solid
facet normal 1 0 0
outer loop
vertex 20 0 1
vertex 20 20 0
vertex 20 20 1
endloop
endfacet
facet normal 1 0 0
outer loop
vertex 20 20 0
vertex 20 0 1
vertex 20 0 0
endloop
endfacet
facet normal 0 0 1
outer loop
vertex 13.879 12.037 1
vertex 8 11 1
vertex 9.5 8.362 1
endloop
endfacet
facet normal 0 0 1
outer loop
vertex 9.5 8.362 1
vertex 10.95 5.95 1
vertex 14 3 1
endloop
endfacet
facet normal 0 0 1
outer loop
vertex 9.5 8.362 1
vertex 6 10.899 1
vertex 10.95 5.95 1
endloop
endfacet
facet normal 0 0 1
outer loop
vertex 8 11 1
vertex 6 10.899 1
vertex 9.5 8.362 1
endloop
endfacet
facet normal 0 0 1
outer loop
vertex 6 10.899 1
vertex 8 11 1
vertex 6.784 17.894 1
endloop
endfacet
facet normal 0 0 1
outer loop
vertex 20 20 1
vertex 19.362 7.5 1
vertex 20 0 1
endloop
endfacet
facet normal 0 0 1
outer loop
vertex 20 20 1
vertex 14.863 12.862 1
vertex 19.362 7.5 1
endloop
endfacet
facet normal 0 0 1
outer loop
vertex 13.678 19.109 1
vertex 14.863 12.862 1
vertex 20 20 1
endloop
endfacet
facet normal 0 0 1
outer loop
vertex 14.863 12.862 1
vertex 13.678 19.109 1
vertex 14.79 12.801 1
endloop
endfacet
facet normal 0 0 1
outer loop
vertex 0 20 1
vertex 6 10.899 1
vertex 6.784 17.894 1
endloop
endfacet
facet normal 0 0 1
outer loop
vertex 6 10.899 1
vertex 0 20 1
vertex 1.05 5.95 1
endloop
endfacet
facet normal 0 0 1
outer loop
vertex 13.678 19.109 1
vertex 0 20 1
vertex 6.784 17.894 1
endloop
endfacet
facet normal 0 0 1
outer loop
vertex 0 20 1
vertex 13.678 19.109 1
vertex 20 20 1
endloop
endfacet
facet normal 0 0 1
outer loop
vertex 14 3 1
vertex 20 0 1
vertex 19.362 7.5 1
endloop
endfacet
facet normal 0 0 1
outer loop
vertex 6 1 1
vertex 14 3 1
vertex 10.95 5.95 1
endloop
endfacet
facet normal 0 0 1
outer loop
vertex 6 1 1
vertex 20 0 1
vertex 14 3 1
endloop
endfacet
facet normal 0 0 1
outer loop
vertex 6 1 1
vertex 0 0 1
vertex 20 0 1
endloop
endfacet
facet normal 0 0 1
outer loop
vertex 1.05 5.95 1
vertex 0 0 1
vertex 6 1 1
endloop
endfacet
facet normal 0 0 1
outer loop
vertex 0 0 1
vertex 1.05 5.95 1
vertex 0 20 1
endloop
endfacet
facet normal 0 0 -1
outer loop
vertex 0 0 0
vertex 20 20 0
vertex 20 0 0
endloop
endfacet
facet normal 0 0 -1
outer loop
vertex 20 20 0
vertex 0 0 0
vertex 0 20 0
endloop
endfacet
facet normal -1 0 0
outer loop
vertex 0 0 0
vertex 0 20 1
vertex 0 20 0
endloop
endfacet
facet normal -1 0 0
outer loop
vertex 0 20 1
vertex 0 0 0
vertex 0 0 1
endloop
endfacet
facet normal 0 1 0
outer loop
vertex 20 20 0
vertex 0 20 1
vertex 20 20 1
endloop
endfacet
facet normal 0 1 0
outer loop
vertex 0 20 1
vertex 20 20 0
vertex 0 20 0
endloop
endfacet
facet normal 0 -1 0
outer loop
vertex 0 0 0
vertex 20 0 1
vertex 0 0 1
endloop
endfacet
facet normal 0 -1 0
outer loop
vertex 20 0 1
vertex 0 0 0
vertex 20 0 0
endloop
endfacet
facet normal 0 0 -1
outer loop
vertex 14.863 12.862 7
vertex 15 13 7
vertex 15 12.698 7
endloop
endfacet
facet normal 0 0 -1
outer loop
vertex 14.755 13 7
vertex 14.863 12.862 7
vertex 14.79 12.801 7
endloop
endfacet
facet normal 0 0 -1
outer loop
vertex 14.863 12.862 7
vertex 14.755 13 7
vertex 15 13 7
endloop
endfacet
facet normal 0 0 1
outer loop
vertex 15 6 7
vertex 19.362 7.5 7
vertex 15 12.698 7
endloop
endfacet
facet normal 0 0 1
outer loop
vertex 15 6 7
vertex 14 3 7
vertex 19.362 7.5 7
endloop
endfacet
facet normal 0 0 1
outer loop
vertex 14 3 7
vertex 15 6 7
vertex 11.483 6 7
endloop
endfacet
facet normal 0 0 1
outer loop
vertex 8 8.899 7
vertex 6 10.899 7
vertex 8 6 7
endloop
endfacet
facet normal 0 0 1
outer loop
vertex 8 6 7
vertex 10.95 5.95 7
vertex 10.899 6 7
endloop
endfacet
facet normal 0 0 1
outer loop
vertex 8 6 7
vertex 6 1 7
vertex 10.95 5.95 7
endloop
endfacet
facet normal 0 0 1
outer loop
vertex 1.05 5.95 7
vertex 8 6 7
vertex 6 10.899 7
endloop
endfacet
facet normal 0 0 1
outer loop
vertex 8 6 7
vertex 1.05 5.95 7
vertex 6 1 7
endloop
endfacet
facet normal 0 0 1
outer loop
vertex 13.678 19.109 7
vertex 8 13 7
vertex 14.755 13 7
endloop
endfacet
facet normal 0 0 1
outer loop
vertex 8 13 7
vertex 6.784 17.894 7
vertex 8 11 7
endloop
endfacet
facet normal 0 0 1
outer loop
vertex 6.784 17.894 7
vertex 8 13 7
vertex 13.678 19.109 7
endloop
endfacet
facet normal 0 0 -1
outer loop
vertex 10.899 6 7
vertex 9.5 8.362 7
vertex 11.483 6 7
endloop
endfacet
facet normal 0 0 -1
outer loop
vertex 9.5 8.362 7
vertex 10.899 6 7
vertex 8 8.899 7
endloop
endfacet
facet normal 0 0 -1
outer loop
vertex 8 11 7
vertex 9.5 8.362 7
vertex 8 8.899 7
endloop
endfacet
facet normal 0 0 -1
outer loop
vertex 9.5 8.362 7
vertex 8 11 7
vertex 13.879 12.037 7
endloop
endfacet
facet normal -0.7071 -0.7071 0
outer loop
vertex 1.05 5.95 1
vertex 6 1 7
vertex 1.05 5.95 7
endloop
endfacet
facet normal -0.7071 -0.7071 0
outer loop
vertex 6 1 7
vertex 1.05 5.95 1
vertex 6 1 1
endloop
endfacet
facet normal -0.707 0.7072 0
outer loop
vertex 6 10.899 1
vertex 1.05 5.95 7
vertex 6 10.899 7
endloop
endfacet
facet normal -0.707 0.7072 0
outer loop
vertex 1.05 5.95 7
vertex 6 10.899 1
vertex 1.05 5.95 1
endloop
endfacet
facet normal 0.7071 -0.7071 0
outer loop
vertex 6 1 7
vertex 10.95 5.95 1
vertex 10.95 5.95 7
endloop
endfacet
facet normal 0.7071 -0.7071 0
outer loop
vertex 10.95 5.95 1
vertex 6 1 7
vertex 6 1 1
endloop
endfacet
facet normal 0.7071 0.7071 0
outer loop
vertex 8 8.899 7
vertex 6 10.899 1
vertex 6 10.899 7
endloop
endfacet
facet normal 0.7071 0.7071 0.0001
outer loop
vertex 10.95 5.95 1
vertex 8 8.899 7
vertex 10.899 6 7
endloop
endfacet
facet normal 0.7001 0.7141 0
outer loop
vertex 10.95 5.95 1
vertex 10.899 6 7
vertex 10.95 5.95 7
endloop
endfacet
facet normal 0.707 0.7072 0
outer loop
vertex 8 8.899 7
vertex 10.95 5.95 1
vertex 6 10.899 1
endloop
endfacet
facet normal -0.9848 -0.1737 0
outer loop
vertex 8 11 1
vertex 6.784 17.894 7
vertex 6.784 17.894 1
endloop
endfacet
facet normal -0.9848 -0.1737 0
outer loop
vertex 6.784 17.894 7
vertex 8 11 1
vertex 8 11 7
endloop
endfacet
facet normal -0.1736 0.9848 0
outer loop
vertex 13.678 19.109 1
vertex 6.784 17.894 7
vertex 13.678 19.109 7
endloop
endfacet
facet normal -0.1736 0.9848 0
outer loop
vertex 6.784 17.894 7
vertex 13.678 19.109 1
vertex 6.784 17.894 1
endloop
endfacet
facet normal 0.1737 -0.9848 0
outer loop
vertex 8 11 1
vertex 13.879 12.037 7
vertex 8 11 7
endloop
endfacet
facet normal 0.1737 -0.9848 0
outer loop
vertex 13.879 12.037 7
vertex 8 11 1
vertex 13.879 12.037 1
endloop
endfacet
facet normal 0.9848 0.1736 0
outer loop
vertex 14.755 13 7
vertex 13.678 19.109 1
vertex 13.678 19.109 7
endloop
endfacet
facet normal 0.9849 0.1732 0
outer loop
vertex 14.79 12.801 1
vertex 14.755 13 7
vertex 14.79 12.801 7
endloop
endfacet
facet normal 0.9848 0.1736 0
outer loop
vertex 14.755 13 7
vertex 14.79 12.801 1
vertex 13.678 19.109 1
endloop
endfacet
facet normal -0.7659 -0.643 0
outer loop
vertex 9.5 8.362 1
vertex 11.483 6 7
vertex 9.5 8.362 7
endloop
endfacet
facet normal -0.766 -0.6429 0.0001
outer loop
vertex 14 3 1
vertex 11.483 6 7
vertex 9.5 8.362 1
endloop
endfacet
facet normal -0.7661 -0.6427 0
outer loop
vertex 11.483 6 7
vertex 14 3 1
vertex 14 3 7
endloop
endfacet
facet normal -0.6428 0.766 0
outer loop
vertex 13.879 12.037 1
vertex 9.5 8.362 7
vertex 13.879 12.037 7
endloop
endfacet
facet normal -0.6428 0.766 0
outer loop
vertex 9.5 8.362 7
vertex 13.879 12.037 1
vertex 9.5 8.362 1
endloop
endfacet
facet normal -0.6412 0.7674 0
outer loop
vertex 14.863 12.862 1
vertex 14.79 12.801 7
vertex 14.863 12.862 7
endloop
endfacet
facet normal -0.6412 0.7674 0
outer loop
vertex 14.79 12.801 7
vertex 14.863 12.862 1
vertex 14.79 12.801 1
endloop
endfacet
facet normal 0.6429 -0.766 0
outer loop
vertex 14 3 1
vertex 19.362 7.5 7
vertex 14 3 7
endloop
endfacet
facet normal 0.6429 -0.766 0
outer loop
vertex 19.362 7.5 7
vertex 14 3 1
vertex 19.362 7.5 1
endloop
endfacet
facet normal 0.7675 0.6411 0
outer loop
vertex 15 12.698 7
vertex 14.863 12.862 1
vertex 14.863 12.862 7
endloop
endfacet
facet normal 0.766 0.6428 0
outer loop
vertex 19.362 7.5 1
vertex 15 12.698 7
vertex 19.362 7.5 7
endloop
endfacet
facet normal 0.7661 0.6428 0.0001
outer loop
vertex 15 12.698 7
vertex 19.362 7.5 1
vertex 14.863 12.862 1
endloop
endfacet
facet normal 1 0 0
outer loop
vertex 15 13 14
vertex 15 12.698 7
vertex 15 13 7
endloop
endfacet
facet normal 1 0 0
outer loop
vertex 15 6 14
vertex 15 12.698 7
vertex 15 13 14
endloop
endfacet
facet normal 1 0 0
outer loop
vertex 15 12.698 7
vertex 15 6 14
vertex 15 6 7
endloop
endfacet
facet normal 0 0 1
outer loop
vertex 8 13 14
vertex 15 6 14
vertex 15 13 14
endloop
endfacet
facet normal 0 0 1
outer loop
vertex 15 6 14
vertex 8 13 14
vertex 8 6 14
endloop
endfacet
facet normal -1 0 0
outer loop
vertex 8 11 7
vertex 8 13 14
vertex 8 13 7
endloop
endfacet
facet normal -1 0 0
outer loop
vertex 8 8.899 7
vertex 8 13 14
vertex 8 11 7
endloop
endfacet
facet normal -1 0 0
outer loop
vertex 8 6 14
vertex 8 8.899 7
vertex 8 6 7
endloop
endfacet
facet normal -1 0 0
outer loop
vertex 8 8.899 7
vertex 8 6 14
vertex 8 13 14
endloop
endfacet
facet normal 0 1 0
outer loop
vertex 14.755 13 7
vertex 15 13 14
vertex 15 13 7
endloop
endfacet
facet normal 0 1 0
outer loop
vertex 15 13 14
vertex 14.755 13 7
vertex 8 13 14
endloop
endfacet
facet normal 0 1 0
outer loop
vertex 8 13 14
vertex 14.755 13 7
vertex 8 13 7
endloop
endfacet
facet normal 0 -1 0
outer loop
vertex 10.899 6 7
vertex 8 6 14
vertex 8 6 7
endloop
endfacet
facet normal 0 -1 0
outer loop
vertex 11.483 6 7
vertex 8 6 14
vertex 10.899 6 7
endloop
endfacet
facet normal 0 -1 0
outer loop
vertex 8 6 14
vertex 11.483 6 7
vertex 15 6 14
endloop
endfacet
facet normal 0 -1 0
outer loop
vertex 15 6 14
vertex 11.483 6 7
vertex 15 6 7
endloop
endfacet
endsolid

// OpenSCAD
// file: ../OpenSCAD/HourOfCode.scad
tileHeight = 5;

module tile(x, y) {

    difference() {
        difference() {
            difference(){
                difference() {
                    translate([x, y, 0])
                        cube([20,20,tileHeight]);

                translate([x , y , tileHeight-3])
                    rotate([45,0,0])
                        cube([20, 4, 4]);
                } 
            translate([x , y + 20, tileHeight-3])
                rotate([45,0,0])
                    cube([20, 4, 4]);
            }

        translate([x , y , tileHeight-3])
            rotate([45,0,90])
               cube([20, 4, 4]);
        }
        translate([x + 20, y + 0, tileHeight-3])
            rotate([45,0,90])
               cube([20, 4, 4]);
    }

}



module cog(x, y) {
    translate([x, y, 0]) {
        cube([20, 20, 1]);
        translate([10, 10, 1]) {
            scale([0.25, 0.25, 0.25]) {
                surface(file = "../OpenSCAD/HourOfCodeCog.png", center = true, convexity = 5);
            }
        }
    }
}

module cross(x, y) {
    translate([x, y, 0]) {
        cube([20, 20, 1]);
            translate([10, 10, 15]) {
            rotate([0, 0, 0]) {
                scale([0.18, 0.18, 0.15]) {
                    surface(file = "../OpenSCAD/HourOfCodeCross.png", invert = true, center = true, convexity = 5);
                }
            }
        }
    }
}

module boxes(x, y) {
    translate([x, y, 0]) {
        cube([20, 20, 1]);
        translate([6, 1, 0])
            rotate([0, 0, 45])
                cube([7, 7, 7]);
        translate([8, 11, 0])
            rotate([0, 0, 10])
                cube([7, 7, 7]);
        translate([14, 3, 0])
            rotate([0, 0, 40])
                cube([7, 7, 7]);
        translate([8, 6, 7])
            rotate([0, 0, 0])
                cube([7, 7, 7]);
    }
}

module boardTest() {
    difference() {
        cube([50, 50, 10]);
        translate([5, 5, 5])
            cube([40, 40, 6]);
    }
    translate([5, 5, 3])
        for (tx =[0:20:30]) 
            for (ty =[0:20:30]) {
                tile(tx,ty);
            }
}

module board() {
    difference() {
        cube([170, 170, 10]);
        translate([5, 5, 5])
            cube([160, 160, 6]);
    }
    translate([5, 5, 3])
        for (tx =[0:20:150]) 
            for (ty =[0:20:150]) {
                tile(tx,ty);
            }
}

module topPiece(x, y) {
    translate([x + 20, y, 8]) {
    rotate([0, 180, 0]) {
        difference() {
            translate([0, 0, 2]) 
                cube([20, 20, 6]);
            tile(0, 0);
        }
    }
}
}

/*
for (tx =[0:22:60]) {
    topPiece(tx, 0);
}
*/



/*
translate([0, 0, 0])
    color("Blue", 0.5)
        cog(0, 0);
//translate([0, 20, 0])
//    rotate([180, 0, 0])
//        topPiece(0, 0);


translate([0, -25, 0])
    color("Red", 0.5)
        cross(0, 0);
//translate([0, -5, 0])
//    rotate([180, 0, 0])
//        topPiece(0, 0);
*/


//tile(0, 0);
//board();
//boardTest();
//topPiece(0,0);
//cog(0, 0);
//cross(0, 0);



  
// main file
include <../OpenSCAD/HourOfCode.scad>;

/*
// ------------------------------------------------------------- //
// ------------------------------------------------------------- //
//                        T O    U S E  ;                        //
// 1. Create a file and add the following line at the top;       //
include <../OpenSCAD/HourOfCode.scad>; // already done in this file
// 2. Use one of the following templates;                        
//tile(x, y);   // build a tile, which a top piece can fit on
//board();      // build an 8 x 8 board of tiles
//boardTest();  // build a 2 x 2 board of tiles
//topPiece(x,0);// build a top piece, which will fit on top of the board
//cog(x, y);    // build a cog, to fit on top of a top piece (scrap metal)
//cross(x, y);  // build a cross, to fit on top of a top piece (bandit)
//boxes(x, y)   // build a pile of boxes, to fit on top of a top piece (obstacle)
// where x and y are the coordinates used to place the model (0, 0 works well)
*/
// ------------------------------------------------------------- //
// ------------------------------------------------------------- //

boxes(0, 0);
